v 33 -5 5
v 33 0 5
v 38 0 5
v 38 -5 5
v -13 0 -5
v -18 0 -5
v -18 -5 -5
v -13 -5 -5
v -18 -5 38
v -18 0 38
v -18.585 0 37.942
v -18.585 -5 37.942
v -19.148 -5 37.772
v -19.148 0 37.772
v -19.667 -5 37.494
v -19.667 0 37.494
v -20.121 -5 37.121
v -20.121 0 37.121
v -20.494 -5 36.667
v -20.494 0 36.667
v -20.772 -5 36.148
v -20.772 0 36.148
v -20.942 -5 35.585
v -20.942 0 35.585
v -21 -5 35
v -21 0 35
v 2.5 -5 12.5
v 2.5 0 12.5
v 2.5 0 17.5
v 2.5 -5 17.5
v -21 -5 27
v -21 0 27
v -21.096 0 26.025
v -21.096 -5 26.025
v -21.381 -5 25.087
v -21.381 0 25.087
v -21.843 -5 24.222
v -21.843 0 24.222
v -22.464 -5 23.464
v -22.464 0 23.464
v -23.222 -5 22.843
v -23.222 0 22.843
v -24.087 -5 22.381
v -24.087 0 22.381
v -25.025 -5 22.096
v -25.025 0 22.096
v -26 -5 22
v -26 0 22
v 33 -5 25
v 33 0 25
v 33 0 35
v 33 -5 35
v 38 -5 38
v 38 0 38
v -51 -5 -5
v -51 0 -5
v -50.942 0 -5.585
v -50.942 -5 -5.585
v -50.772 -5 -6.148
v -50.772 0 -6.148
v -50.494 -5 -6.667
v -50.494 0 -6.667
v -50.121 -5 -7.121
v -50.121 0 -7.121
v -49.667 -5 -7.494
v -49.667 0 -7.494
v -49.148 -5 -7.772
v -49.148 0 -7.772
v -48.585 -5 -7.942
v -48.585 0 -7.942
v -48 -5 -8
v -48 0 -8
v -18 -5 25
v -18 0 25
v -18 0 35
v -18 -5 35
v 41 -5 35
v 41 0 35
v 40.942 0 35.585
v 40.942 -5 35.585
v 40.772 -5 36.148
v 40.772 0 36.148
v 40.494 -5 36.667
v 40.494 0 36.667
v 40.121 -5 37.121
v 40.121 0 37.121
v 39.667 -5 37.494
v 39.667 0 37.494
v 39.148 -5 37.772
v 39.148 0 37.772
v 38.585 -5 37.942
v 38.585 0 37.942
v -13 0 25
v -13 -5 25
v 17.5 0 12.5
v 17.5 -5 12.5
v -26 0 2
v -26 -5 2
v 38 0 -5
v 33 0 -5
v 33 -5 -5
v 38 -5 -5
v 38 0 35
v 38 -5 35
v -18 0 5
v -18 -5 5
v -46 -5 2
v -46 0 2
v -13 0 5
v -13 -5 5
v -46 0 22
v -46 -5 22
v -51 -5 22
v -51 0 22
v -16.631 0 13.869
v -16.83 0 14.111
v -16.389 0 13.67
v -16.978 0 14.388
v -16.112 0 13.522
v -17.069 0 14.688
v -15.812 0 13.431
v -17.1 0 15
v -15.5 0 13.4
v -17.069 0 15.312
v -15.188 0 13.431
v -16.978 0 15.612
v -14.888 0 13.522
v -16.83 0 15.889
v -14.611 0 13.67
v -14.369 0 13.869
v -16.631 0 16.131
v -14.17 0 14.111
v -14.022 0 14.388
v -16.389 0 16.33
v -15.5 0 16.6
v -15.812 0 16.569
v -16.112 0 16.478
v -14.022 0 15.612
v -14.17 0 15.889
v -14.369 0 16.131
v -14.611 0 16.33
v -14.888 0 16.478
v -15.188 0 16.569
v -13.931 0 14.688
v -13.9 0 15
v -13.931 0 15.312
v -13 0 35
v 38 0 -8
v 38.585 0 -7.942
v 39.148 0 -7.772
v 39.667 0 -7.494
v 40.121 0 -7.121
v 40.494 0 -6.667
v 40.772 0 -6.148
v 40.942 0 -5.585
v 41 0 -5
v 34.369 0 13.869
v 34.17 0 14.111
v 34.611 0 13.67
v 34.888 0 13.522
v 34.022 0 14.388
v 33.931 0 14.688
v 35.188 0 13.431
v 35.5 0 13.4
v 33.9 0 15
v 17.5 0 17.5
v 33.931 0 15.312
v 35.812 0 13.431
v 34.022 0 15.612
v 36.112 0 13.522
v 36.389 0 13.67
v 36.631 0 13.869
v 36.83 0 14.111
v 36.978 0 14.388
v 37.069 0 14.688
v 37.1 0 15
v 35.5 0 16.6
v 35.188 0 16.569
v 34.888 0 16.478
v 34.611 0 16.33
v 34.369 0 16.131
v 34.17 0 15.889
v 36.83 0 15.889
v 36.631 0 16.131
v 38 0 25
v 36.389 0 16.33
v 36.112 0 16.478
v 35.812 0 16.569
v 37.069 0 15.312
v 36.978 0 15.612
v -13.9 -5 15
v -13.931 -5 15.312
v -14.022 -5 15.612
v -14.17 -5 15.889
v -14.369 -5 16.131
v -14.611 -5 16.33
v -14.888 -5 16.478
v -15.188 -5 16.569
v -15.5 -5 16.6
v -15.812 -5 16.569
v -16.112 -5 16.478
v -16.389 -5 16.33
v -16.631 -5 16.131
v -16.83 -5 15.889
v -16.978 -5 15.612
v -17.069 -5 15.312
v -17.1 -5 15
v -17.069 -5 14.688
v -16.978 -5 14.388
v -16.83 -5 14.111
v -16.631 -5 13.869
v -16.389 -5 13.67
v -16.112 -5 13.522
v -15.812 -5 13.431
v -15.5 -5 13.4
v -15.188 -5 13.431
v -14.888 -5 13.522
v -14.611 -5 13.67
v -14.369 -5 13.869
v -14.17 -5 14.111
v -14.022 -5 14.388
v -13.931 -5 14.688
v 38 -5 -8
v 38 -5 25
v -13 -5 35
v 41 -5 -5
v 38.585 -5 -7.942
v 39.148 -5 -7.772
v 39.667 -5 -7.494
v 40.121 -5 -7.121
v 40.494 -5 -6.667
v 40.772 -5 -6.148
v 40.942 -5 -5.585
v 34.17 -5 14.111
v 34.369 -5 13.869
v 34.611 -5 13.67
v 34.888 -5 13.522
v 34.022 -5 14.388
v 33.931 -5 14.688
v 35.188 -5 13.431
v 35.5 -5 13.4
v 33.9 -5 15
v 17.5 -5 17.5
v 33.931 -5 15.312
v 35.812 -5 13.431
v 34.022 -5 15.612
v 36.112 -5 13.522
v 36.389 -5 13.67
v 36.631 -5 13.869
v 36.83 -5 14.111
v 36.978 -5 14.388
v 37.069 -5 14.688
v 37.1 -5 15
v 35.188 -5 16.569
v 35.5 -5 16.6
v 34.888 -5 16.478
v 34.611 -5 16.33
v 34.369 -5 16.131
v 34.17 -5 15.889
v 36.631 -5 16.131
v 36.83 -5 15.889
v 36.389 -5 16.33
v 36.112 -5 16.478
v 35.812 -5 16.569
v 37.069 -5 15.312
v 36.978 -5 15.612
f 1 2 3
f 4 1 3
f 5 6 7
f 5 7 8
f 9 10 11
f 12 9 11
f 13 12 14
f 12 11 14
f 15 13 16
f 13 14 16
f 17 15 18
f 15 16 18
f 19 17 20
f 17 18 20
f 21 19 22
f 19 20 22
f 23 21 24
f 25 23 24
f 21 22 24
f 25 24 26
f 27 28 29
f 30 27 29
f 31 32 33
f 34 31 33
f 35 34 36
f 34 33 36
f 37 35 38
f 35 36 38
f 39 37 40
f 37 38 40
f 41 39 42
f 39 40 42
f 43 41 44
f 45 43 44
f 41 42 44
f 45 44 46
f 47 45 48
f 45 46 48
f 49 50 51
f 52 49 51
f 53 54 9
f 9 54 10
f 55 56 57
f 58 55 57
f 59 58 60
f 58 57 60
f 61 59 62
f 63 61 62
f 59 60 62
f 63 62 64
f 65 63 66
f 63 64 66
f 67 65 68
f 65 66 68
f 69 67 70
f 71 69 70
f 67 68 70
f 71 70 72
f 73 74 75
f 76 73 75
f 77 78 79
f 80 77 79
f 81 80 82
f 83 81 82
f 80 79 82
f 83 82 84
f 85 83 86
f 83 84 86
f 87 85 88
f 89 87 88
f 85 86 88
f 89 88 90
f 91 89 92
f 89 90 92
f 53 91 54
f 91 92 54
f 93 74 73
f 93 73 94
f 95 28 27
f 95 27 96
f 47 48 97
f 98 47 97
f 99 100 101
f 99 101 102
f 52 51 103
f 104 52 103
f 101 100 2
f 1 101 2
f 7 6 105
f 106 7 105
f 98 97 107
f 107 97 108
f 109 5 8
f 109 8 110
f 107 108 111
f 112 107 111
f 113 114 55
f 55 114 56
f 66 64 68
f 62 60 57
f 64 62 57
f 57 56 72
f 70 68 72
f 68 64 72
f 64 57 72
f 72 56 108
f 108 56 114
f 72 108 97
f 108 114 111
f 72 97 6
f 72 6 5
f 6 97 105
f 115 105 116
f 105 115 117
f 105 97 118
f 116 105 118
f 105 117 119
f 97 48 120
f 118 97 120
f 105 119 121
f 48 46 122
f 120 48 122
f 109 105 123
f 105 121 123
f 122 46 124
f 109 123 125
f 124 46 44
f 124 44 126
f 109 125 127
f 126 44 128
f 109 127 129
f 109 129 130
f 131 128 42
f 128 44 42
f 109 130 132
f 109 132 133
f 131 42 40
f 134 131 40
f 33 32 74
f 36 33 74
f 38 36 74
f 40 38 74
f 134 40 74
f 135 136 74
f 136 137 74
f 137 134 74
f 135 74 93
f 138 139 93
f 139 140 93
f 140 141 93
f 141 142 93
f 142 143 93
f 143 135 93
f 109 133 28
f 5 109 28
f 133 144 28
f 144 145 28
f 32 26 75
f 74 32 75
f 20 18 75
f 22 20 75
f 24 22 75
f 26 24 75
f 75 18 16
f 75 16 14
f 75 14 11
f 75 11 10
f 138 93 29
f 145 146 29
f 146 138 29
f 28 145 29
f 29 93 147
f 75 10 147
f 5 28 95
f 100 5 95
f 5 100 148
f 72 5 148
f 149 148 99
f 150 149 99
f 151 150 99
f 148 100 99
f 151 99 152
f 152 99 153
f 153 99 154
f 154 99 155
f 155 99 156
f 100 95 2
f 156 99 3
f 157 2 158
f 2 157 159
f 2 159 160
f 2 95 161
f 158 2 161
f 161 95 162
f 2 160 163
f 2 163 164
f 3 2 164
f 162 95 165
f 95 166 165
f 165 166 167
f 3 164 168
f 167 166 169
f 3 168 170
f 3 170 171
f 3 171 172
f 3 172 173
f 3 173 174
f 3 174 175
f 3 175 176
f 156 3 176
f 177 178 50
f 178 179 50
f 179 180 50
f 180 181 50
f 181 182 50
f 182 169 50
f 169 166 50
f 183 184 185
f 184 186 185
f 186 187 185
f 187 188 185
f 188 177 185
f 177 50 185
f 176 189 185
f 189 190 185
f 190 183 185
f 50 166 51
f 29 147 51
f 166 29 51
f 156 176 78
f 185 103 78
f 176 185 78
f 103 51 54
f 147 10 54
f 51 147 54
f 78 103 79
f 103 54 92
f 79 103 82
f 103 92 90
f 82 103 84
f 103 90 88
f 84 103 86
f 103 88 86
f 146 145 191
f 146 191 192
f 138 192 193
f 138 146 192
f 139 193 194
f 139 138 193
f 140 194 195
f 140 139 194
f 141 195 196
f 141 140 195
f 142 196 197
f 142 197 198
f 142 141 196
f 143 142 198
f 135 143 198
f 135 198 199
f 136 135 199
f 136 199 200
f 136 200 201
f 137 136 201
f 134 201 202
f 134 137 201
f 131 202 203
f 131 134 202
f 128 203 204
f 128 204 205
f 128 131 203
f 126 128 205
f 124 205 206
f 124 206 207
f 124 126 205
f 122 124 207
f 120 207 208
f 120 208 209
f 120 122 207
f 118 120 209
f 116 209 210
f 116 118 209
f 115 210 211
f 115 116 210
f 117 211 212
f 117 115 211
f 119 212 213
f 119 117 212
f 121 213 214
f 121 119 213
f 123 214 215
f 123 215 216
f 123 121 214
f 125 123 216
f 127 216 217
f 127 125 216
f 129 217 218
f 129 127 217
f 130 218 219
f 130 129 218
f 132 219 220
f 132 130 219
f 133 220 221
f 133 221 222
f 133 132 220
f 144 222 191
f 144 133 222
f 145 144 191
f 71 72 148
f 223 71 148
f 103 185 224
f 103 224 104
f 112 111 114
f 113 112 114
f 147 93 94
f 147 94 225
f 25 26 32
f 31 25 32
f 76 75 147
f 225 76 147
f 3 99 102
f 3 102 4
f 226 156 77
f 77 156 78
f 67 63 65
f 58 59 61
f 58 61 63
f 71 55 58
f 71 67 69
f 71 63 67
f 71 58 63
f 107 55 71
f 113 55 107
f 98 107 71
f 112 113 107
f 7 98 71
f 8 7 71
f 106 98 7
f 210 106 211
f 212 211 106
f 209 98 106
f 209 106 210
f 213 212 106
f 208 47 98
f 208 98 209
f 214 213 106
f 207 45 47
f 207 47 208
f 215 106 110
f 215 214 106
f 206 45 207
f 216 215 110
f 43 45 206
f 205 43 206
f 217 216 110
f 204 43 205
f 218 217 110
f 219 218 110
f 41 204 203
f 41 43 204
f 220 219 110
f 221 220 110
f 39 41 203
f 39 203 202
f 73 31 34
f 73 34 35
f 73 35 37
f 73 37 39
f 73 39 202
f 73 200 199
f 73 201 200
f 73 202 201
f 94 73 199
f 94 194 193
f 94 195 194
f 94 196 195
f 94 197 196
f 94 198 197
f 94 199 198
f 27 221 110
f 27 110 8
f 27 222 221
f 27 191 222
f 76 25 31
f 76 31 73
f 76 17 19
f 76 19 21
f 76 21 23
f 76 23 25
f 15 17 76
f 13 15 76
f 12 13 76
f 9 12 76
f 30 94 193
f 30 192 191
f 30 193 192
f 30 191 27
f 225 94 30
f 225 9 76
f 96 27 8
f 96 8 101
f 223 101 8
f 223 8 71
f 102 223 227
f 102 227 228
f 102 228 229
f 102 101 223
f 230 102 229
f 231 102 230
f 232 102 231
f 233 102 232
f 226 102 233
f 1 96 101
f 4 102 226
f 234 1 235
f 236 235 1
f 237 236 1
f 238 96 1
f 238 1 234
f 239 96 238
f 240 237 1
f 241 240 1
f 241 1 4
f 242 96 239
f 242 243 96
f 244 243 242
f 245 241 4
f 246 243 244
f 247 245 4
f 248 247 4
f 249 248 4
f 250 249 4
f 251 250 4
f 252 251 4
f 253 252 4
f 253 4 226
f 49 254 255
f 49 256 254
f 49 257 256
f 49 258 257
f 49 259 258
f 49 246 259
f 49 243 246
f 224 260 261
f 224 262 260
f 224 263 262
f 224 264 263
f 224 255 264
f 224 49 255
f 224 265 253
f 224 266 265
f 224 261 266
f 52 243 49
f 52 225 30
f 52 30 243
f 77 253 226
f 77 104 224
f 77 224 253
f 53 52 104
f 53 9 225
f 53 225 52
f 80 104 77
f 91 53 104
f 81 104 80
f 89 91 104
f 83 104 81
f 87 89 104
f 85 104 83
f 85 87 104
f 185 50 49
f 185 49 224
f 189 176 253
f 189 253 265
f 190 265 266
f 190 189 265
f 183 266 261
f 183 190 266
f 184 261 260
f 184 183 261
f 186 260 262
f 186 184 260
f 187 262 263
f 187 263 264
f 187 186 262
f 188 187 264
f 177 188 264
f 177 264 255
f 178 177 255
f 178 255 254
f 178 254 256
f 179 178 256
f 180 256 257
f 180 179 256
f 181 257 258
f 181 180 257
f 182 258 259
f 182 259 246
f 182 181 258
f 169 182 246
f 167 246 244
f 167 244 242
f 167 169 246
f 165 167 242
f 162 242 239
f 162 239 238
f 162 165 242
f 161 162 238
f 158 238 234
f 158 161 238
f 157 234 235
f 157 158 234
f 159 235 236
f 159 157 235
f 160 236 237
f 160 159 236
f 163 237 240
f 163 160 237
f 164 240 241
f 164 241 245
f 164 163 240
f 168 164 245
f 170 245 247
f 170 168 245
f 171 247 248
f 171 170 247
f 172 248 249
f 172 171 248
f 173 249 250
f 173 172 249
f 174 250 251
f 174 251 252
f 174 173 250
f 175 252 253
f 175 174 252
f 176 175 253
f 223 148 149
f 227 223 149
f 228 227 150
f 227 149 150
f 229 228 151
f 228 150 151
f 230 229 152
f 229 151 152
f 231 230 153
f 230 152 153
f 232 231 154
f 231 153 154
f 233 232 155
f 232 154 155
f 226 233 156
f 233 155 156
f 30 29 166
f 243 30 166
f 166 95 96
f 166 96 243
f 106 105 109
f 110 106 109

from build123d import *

# Parameters (mm, degrees)
F1_W     = 5
F1_H     = 10
F1_R     = 1.6
F1_W_2   = 15
F1_H_2   = 5
F2_DEPTH = 5


with BuildPart() as f2:
    # F1 (on Front) → F2 (new body)
    with BuildSketch(Plane.XZ):
        with BuildLine():
            Line((-21, 35), (-21, 27))
            ThreePointArc((-21, 27), (-22.4644660941, 23.4644660941), (-26, 22))
            Line((-26, 22), (-26, 2))
            Line((-26, 2), (-46.0000009239, 2))
            Line((-46.0000009239, 2), (-46.0000009239, 22.0000018477))
            Line((-46.0000009239, 22.0000018477), (-51, 22.0000018477))
            Line((-51, 22.0000018477), (-51, -5))
            ThreePointArc((-51, -5), (-50.1213203436, -7.1213203436), (-48, -8))
            Line((-48, -8), (38, -8))
            ThreePointArc((38, -8), (40.1213203436, -7.1213203436), (41, -5))
            Line((41, -5), (41, 35))
            ThreePointArc((41, 35), (40.1213203436, 37.1213203436), (38, 38))
            Line((38, 38), (-18, 38))
            ThreePointArc((-18, 38), (-20.1213203436, 37.1213203436), (-21, 35))
        make_face()
        with Locations((-15.5, 0)):
            Rectangle(F1_W, F1_H, mode=Mode.SUBTRACT)
        with Locations((35.5, 0)):
            Rectangle(F1_W, F1_H, mode=Mode.SUBTRACT)
        with Locations((-15.5, 15)):
            Circle(F1_R, mode=Mode.SUBTRACT)
        with Locations((-15.5, 30)):
            Rectangle(F1_W, F1_H, mode=Mode.SUBTRACT)
        with Locations((10, 15)):
            Rectangle(F1_W_2, F1_H_2, mode=Mode.SUBTRACT)
        with Locations((35.5, 15)):
            Circle(F1_R, mode=Mode.SUBTRACT)
        with Locations((35.5, 30)):
            Rectangle(F1_W, F1_H, mode=Mode.SUBTRACT)
    extrude(amount=F2_DEPTH)


solid = f2.part
